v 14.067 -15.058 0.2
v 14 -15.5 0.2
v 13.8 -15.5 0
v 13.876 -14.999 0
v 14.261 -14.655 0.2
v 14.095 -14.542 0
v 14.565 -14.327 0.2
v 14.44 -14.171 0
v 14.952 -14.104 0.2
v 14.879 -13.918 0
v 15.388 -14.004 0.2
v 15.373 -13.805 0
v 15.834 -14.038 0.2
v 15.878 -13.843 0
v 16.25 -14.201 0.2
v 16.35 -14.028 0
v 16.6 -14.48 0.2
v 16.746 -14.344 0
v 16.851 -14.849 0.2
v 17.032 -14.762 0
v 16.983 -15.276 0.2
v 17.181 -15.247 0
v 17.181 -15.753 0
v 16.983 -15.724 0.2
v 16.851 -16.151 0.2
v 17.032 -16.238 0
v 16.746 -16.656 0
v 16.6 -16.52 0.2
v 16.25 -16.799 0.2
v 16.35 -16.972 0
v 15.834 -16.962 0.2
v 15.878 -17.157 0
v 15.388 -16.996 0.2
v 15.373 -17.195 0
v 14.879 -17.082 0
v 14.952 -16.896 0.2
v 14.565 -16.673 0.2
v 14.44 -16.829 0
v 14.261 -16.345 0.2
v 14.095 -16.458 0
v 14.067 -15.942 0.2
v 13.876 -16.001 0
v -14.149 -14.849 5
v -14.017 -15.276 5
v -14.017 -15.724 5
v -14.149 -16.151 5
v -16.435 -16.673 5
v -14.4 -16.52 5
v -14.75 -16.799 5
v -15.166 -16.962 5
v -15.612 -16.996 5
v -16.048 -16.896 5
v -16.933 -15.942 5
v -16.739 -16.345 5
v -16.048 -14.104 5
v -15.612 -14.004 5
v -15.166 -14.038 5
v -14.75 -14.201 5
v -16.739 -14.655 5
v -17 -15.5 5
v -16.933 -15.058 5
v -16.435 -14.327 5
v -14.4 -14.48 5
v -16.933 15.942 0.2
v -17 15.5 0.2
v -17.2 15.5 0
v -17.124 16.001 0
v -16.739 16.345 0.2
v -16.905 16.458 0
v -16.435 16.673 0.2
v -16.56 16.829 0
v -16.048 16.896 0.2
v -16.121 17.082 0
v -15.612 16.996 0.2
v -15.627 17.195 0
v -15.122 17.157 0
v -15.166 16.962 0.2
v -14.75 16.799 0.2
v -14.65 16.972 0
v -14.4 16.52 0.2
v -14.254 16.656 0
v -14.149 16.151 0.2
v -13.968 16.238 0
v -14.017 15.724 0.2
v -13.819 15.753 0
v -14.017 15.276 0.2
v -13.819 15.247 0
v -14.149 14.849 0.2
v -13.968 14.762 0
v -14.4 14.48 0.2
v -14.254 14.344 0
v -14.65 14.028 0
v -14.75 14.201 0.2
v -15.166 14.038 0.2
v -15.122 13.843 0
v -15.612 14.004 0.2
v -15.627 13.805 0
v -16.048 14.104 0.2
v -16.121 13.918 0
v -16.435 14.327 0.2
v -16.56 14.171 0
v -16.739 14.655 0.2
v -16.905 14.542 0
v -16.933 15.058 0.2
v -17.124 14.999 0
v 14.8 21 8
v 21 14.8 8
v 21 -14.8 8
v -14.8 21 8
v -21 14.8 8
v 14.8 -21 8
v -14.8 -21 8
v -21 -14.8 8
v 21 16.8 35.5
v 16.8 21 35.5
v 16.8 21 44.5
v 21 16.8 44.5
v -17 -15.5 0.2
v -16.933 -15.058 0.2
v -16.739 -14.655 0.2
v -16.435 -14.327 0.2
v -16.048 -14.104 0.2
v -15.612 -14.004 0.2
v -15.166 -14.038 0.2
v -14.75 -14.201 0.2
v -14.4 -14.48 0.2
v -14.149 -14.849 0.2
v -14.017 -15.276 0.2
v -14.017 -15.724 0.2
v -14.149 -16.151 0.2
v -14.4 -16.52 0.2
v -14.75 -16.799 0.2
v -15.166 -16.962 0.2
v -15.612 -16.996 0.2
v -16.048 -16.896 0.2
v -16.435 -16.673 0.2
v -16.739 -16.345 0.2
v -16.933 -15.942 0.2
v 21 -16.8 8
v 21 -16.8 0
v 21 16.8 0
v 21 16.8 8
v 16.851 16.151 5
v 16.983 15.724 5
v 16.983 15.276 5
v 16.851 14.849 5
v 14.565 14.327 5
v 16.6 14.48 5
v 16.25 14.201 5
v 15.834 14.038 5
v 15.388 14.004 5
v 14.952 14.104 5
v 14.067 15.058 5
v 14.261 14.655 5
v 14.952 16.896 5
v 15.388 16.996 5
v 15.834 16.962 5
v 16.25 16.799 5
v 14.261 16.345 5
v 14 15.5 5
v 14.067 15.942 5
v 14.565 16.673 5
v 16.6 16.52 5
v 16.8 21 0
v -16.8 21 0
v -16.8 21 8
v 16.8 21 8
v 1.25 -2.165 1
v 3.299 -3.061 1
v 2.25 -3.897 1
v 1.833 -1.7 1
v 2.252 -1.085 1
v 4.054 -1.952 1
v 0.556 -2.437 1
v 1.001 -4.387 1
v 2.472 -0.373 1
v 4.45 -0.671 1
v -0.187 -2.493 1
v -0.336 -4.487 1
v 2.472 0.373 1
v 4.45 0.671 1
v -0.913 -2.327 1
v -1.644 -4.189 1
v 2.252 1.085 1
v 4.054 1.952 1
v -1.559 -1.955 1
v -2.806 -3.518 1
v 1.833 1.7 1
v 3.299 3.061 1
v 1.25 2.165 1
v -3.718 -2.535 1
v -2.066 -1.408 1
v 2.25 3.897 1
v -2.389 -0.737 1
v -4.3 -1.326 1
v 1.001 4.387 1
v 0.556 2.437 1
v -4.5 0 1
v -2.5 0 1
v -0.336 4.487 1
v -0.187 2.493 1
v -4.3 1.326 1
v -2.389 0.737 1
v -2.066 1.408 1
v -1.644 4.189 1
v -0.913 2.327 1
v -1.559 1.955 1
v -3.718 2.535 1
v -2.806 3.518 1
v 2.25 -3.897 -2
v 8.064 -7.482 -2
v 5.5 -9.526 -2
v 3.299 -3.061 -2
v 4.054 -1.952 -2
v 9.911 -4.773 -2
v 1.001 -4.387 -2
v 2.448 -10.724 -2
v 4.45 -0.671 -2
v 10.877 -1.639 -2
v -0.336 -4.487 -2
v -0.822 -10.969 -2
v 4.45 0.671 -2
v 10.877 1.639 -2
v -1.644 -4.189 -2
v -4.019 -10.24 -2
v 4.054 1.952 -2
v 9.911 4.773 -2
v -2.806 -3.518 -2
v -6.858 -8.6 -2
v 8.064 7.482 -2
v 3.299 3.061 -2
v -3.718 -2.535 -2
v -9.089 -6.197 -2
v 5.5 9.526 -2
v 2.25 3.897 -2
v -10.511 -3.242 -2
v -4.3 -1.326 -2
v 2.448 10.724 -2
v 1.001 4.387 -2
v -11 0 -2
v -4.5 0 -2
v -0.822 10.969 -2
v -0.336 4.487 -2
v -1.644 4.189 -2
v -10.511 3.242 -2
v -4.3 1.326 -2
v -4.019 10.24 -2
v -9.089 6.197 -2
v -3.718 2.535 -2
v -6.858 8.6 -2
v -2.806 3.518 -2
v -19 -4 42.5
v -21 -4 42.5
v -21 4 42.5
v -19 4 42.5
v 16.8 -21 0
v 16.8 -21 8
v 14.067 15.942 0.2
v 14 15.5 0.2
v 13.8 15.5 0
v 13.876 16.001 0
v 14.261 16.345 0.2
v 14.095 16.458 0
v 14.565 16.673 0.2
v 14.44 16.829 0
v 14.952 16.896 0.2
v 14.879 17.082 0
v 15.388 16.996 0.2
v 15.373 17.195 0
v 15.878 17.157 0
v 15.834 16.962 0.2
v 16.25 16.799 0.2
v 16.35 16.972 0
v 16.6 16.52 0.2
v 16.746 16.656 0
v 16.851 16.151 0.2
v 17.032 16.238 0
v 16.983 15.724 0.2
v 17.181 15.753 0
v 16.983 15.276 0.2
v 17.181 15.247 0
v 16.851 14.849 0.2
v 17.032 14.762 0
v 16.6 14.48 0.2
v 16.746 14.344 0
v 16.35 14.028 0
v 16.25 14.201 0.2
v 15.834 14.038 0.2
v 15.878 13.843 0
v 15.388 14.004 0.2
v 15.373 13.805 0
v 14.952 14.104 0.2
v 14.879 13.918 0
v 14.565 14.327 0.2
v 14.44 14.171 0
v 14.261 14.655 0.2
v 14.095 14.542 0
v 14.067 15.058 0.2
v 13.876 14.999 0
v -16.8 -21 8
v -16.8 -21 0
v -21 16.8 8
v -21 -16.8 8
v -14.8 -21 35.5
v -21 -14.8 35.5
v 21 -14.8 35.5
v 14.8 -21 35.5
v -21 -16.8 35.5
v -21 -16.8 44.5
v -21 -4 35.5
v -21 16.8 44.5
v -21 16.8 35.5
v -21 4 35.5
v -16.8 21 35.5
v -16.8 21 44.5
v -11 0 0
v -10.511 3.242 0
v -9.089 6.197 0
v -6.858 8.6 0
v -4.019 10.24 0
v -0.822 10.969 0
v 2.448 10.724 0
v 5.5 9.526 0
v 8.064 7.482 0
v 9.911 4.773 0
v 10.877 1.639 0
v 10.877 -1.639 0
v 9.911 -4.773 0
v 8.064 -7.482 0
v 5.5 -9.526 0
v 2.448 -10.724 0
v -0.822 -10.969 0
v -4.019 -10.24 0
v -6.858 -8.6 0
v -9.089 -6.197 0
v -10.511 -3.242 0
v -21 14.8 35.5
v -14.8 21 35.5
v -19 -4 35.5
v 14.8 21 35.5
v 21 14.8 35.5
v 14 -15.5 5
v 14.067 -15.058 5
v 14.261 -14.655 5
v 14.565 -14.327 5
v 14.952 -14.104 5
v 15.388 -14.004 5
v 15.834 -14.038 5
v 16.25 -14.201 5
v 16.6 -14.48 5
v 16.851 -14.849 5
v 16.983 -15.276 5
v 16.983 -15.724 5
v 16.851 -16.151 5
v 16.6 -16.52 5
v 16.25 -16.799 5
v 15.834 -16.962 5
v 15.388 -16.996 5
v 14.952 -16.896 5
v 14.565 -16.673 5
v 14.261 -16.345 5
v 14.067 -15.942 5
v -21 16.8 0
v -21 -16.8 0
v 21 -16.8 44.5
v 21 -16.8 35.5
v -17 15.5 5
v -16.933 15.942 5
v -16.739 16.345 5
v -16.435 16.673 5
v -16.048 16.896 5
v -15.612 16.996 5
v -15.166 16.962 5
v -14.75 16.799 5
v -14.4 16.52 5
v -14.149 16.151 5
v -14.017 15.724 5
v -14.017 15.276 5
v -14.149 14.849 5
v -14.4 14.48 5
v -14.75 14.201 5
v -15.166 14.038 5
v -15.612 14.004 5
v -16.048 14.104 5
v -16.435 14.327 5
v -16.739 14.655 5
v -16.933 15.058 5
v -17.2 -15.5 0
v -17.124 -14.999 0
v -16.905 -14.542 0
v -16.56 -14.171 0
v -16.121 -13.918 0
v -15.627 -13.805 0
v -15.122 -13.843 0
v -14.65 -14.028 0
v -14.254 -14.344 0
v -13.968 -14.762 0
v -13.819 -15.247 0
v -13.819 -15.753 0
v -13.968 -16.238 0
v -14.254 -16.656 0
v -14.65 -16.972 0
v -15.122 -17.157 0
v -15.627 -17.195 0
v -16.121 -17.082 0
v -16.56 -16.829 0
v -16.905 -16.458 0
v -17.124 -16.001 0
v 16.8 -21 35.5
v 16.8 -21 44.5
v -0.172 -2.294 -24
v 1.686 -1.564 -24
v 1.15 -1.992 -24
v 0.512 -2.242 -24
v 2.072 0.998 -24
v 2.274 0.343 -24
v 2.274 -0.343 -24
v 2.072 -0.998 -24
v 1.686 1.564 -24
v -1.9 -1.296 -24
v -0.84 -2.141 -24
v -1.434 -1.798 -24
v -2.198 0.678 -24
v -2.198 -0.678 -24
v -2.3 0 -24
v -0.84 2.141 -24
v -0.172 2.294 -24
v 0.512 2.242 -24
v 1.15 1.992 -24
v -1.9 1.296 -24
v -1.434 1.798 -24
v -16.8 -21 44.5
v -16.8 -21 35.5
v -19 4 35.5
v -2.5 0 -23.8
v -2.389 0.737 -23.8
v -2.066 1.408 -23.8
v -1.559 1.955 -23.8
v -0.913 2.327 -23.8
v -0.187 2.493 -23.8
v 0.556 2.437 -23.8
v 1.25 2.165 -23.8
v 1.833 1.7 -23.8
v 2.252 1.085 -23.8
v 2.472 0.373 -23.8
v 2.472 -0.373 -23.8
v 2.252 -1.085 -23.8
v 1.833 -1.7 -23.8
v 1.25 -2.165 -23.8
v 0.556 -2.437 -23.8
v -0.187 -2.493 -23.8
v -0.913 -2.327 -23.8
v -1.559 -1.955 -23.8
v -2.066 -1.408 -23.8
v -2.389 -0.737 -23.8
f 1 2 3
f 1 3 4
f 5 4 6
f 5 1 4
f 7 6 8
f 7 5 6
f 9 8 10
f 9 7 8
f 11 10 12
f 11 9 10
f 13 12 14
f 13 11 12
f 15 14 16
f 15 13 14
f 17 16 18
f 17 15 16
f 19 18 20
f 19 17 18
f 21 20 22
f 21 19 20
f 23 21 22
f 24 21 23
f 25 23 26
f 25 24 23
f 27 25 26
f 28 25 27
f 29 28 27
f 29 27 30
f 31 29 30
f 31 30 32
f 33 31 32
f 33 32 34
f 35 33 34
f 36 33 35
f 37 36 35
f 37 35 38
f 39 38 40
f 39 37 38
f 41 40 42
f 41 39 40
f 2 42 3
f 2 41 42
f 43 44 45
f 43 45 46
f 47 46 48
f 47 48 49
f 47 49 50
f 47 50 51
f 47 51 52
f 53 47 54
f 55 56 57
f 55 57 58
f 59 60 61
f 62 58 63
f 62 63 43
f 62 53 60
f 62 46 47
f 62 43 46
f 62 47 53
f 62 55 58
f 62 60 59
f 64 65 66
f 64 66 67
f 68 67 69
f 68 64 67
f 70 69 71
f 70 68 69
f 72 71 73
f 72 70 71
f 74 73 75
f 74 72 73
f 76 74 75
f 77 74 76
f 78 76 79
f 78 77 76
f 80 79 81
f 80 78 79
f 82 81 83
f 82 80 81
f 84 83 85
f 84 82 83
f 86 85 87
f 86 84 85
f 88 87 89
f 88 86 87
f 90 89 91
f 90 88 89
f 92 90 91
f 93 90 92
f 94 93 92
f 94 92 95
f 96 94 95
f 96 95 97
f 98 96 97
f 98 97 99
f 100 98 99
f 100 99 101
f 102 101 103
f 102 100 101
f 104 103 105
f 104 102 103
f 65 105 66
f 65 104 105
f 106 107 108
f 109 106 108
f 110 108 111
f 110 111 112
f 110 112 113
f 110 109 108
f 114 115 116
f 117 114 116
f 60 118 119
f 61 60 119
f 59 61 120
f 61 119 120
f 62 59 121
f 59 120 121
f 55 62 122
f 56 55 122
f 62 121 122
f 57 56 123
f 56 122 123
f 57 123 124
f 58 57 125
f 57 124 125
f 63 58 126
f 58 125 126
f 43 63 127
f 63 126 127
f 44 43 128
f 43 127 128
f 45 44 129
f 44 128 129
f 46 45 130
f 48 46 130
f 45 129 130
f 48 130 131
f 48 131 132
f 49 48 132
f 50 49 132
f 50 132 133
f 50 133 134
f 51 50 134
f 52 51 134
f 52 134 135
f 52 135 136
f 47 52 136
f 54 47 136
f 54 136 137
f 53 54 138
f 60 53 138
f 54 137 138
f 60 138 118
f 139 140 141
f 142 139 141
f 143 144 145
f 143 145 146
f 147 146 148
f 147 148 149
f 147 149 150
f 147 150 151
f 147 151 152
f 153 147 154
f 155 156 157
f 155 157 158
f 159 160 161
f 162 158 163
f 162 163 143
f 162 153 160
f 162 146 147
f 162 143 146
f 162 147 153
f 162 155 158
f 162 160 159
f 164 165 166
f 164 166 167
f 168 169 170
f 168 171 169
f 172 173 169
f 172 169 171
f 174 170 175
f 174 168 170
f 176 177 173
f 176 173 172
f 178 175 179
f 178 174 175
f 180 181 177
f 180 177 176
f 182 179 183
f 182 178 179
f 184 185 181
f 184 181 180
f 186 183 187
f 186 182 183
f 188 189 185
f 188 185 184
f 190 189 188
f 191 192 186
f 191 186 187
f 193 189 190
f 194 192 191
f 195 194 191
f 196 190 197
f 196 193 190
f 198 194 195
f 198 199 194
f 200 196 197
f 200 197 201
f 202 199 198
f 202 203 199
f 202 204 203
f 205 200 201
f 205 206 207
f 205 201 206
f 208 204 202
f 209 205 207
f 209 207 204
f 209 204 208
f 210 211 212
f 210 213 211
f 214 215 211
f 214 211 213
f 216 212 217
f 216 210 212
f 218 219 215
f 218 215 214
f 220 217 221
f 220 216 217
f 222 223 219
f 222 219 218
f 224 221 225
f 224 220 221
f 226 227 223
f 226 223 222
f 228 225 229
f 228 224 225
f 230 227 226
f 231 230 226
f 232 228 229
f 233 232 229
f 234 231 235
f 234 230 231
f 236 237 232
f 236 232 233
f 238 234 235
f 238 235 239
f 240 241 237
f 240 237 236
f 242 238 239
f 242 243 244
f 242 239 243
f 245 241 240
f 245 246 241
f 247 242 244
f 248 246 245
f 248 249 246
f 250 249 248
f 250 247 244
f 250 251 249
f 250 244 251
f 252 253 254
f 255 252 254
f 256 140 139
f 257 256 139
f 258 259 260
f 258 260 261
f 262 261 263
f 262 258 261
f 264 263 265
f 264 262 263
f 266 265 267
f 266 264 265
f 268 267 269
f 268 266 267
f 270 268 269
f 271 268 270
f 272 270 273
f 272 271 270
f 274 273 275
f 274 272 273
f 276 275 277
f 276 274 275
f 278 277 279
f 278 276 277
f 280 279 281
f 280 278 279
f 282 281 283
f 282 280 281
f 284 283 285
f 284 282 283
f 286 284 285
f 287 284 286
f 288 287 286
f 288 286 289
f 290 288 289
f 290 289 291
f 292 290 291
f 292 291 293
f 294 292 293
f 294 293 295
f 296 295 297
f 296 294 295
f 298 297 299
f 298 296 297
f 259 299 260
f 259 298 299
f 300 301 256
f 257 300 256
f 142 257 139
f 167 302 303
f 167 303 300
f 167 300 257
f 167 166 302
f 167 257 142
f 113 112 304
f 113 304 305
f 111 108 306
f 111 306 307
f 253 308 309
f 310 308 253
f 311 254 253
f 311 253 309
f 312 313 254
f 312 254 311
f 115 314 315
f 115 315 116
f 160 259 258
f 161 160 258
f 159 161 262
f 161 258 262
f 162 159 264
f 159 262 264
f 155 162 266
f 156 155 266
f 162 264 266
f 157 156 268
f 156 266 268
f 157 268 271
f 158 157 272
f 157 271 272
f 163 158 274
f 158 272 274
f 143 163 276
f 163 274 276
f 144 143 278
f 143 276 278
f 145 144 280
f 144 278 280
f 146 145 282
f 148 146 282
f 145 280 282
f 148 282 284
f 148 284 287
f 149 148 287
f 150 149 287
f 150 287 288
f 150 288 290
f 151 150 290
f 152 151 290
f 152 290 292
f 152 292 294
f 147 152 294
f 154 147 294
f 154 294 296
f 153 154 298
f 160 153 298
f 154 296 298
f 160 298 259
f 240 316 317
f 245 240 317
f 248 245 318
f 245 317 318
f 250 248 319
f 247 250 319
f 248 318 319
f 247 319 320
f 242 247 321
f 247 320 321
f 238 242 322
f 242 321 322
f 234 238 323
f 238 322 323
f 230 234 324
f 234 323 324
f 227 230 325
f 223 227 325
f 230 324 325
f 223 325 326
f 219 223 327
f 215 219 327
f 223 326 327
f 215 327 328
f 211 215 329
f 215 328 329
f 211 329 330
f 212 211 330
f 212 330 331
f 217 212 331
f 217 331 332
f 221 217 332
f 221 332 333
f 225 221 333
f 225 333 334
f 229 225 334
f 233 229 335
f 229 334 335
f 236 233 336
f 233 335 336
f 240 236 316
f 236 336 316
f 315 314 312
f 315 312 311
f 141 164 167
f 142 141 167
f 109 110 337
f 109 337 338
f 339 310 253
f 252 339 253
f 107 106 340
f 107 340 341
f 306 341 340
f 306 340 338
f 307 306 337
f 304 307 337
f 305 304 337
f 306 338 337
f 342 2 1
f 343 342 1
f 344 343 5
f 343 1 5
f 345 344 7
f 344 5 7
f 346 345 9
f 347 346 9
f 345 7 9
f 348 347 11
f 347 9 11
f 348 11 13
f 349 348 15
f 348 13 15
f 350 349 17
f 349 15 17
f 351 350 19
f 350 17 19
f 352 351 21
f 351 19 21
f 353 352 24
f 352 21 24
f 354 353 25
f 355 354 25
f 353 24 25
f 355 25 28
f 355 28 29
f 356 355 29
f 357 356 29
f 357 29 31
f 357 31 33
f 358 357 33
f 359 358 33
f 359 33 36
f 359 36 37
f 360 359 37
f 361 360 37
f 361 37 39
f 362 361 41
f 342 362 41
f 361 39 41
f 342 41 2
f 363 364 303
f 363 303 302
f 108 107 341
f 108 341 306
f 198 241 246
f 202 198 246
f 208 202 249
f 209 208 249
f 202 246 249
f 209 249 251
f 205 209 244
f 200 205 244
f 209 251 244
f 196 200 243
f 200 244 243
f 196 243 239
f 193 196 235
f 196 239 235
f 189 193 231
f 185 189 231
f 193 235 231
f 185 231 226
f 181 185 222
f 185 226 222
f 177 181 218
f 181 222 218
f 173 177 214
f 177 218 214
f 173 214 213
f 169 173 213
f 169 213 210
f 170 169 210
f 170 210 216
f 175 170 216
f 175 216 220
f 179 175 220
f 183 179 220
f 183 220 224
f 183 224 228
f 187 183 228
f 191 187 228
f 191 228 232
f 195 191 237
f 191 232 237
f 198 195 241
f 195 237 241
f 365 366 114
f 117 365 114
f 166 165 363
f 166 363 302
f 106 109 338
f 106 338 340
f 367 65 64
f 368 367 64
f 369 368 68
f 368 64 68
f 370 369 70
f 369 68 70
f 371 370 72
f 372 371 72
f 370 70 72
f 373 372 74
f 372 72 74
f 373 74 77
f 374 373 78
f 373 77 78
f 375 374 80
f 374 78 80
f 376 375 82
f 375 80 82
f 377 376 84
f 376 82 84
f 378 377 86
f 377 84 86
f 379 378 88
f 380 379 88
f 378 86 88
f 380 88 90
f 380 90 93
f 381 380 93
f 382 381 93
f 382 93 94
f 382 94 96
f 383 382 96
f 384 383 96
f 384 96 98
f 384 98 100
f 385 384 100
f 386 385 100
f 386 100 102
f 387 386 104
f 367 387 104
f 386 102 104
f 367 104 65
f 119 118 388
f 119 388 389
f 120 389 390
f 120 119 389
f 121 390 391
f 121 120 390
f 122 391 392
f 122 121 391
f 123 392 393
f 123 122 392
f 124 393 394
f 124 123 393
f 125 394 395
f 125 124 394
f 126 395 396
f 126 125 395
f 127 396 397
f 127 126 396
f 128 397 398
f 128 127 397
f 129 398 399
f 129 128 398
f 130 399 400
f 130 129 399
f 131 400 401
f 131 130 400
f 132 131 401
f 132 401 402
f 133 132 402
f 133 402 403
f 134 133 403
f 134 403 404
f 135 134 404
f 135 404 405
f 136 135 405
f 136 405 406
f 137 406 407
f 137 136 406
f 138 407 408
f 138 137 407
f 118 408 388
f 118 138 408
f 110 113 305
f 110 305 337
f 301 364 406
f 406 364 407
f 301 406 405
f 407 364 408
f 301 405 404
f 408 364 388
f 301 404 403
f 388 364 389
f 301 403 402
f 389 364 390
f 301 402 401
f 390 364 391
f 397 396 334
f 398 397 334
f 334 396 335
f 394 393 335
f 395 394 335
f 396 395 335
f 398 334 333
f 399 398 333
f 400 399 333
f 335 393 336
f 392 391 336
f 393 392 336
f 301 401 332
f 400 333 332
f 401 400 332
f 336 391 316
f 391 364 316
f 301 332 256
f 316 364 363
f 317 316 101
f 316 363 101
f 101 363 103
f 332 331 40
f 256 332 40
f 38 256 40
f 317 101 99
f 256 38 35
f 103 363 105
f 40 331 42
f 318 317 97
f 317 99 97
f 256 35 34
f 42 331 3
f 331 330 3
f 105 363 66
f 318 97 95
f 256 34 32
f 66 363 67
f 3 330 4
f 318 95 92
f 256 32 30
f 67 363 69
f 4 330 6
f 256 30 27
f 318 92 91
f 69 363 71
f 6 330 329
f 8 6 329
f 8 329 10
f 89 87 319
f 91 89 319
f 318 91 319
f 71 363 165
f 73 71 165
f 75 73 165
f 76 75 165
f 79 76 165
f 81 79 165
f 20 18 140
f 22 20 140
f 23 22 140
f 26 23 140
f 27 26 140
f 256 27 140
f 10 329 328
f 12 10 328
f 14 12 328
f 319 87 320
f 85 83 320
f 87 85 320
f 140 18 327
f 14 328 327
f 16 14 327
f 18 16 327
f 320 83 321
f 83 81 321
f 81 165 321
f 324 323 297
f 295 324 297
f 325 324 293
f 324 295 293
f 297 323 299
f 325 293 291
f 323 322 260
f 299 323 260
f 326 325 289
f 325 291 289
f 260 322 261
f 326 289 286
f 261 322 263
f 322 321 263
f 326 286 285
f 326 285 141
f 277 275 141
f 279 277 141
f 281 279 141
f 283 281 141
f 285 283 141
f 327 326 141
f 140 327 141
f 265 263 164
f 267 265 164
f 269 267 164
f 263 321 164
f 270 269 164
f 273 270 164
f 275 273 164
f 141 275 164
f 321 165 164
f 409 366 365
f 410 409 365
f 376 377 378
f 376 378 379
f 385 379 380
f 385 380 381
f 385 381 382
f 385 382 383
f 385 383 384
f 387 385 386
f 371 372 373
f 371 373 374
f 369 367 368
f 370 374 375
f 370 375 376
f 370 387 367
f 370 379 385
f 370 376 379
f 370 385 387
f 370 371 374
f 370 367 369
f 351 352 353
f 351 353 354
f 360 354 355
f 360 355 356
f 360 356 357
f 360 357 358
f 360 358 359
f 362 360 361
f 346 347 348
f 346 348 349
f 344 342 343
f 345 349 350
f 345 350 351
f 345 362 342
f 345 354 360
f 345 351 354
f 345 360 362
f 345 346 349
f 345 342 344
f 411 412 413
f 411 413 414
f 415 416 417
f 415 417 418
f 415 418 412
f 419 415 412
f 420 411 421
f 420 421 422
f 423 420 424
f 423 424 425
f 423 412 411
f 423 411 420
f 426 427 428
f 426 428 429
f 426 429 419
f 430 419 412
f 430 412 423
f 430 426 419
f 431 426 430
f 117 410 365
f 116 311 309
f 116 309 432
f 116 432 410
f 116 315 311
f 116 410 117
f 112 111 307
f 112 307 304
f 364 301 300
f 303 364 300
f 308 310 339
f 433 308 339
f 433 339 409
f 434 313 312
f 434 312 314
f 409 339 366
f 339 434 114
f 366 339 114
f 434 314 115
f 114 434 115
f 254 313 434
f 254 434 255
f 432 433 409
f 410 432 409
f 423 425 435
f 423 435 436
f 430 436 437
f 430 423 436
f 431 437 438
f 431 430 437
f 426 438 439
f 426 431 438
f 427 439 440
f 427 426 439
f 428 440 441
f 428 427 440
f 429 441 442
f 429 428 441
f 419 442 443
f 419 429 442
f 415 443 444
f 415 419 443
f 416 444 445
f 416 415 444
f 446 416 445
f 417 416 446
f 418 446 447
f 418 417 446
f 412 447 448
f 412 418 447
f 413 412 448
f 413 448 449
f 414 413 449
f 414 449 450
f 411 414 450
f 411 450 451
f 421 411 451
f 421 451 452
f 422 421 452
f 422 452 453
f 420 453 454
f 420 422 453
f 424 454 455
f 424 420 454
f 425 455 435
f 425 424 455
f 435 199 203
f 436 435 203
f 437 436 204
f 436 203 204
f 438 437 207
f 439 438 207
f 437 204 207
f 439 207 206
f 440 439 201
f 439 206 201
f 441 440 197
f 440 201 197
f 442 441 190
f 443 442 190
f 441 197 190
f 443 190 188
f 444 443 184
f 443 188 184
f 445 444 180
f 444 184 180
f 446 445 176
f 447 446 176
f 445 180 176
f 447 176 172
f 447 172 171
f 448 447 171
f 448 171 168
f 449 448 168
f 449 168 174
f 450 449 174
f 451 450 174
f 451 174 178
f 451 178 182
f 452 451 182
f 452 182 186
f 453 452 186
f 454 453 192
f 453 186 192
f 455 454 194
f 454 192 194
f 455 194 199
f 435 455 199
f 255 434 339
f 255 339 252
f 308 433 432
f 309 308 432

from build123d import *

# Parameters (mm, degrees)
ESQUISSE1_W             = 42
ESQUISSE1_H             = 42
BOSS_EXTRU_1_DEPTH      = 8
CHANFREIN1_SIZE         = 4.2
BOSS_EXTRU_2_DEPTH      = 27.5
ESQUISSE4_W             = 42
ESQUISSE4_H             = 42
BOSS_EXTRU_3_DEPTH      = 9
CHANFREIN3_SIZE         = 4.2
ESQUISSE5_R             = 11
BOSS_EXTRU_4_DEPTH      = 2
ESQUISSE6_R             = 4.5
ENL_V_MAT_EXTRU_1_DEPTH = 3
ESQUISSE7_R             = 2.5
BOSS_EXTRU_5_DEPTH      = 25
CHANFREIN4_SIZE         = 0.2
ESQUISSE8_R             = 1.5
ENL_V_MAT_EXTRU_2_DEPTH = 5
CHANFREIN5_SIZE         = 0.2
ESQUISSE9_W             = 7
ESQUISSE9_H             = 8
ENL_V_MAT_EXTRU_3_DEPTH = 2


with BuildPart() as part:
    # Esquisse1 → Boss.-Extru.1 (new body)
    with BuildSketch(Plane.XY):
        Rectangle(ESQUISSE1_W, ESQUISSE1_H)
    extrude(amount=BOSS_EXTRU_1_DEPTH)

    # Chanfrein1
    chanfrein1_edges = [part.edges().sort_by_distance(p)[0] for p in [
        (21, -21, 4),
        (-21, -21, 4),
        (-21, 21, 4),
        (21, 21, 4),
    ]]
    chamfer(chanfrein1_edges, length=CHANFREIN1_SIZE)

    # Esquisse5 → Boss.-Extru.4 (add)
    with BuildSketch(Plane(origin=(0, 0, 0), x_dir=(-1, 0, 0), z_dir=(0, 0, -1))):
        Circle(ESQUISSE5_R)
    extrude(amount=BOSS_EXTRU_4_DEPTH)

    # Esquisse6 → Enlèv. mat.-Extru.1 (cut)
    with BuildSketch(Plane(origin=(0, 0, -2), x_dir=(-1, 0, 0), z_dir=(0, 0, -1))):
        Circle(ESQUISSE6_R)
    extrude(amount=-ENL_V_MAT_EXTRU_1_DEPTH, mode=Mode.SUBTRACT)

    # Esquisse7 → Boss.-Extru.5 (add)
    with BuildSketch(Plane(origin=(0, 0, 1), x_dir=(-1, 0, 0), z_dir=(0, 0, -1))):
        Circle(ESQUISSE7_R)
    extrude(amount=BOSS_EXTRU_5_DEPTH)

    # Chanfrein4
    chanfrein4_edges = [part.edges().sort_by_distance(p)[0] for p in [
        (2.5, 0, -24),
    ]]
    chamfer(chanfrein4_edges, length=CHANFREIN4_SIZE)

    # Esquisse8 → Enlèv. mat.-Extru.2 (cut)
    with BuildSketch(Plane(origin=(0, 0, 0), x_dir=(-1, 0, 0), z_dir=(0, 0, -1))):
        with Locations((-15.5, 15.5)):
            Circle(ESQUISSE8_R)
        with Locations((15.5, 15.5)):
            Circle(ESQUISSE8_R)
        with Locations((15.5, -15.5)):
            Circle(ESQUISSE8_R)
        with Locations((-15.5, -15.5)):
            Circle(ESQUISSE8_R)
    extrude(amount=-ENL_V_MAT_EXTRU_2_DEPTH, mode=Mode.SUBTRACT)

    # Chanfrein5
    chanfrein5_edges = [part.edges().sort_by_distance(p)[0] for p in [
        (17, 15.5, 0),
        (-14, 15.5, 0),
        (-14, -15.5, 0),
        (17, -15.5, 0),
    ]]
    chamfer(chanfrein5_edges, length=CHANFREIN5_SIZE)


with BuildPart() as body_2:
    # Esquisse3 → Boss.-Extru.2 (new body)
    with BuildSketch(Plane.XY.offset(8)):
        Polygon((-21, 14.8), (-14.8, 21), (14.8, 21), (21, 14.8), (21, -14.8), (14.8, -21), (-14.8, -21), (-21, -14.8), align=None)
    extrude(amount=BOSS_EXTRU_2_DEPTH)


with BuildPart() as body_3:
    # Esquisse4 → Boss.-Extru.3 (new body)
    with BuildSketch(Plane.XY.offset(35.5)):
        Rectangle(ESQUISSE4_W, ESQUISSE4_H)
    extrude(amount=BOSS_EXTRU_3_DEPTH)

    # Chanfrein3
    chanfrein3_edges = [body_3.edges().sort_by_distance(p)[0] for p in [
        (21, -21, 40),
        (-21, -21, 40),
        (-21, 21, 40),
        (21, 21, 40),
    ]]
    chamfer(chanfrein3_edges, length=CHANFREIN3_SIZE)

    # Esquisse9 → Enlèv. mat.-Extru.3 (cut)
    with BuildSketch(Plane.ZY.offset(21)):
        with Locations((39, 0)):
            Rectangle(ESQUISSE9_W, ESQUISSE9_H)
    extrude(amount=-ENL_V_MAT_EXTRU_3_DEPTH, mode=Mode.SUBTRACT)


solid = Compound([part.part, body_2.part, body_3.part])
